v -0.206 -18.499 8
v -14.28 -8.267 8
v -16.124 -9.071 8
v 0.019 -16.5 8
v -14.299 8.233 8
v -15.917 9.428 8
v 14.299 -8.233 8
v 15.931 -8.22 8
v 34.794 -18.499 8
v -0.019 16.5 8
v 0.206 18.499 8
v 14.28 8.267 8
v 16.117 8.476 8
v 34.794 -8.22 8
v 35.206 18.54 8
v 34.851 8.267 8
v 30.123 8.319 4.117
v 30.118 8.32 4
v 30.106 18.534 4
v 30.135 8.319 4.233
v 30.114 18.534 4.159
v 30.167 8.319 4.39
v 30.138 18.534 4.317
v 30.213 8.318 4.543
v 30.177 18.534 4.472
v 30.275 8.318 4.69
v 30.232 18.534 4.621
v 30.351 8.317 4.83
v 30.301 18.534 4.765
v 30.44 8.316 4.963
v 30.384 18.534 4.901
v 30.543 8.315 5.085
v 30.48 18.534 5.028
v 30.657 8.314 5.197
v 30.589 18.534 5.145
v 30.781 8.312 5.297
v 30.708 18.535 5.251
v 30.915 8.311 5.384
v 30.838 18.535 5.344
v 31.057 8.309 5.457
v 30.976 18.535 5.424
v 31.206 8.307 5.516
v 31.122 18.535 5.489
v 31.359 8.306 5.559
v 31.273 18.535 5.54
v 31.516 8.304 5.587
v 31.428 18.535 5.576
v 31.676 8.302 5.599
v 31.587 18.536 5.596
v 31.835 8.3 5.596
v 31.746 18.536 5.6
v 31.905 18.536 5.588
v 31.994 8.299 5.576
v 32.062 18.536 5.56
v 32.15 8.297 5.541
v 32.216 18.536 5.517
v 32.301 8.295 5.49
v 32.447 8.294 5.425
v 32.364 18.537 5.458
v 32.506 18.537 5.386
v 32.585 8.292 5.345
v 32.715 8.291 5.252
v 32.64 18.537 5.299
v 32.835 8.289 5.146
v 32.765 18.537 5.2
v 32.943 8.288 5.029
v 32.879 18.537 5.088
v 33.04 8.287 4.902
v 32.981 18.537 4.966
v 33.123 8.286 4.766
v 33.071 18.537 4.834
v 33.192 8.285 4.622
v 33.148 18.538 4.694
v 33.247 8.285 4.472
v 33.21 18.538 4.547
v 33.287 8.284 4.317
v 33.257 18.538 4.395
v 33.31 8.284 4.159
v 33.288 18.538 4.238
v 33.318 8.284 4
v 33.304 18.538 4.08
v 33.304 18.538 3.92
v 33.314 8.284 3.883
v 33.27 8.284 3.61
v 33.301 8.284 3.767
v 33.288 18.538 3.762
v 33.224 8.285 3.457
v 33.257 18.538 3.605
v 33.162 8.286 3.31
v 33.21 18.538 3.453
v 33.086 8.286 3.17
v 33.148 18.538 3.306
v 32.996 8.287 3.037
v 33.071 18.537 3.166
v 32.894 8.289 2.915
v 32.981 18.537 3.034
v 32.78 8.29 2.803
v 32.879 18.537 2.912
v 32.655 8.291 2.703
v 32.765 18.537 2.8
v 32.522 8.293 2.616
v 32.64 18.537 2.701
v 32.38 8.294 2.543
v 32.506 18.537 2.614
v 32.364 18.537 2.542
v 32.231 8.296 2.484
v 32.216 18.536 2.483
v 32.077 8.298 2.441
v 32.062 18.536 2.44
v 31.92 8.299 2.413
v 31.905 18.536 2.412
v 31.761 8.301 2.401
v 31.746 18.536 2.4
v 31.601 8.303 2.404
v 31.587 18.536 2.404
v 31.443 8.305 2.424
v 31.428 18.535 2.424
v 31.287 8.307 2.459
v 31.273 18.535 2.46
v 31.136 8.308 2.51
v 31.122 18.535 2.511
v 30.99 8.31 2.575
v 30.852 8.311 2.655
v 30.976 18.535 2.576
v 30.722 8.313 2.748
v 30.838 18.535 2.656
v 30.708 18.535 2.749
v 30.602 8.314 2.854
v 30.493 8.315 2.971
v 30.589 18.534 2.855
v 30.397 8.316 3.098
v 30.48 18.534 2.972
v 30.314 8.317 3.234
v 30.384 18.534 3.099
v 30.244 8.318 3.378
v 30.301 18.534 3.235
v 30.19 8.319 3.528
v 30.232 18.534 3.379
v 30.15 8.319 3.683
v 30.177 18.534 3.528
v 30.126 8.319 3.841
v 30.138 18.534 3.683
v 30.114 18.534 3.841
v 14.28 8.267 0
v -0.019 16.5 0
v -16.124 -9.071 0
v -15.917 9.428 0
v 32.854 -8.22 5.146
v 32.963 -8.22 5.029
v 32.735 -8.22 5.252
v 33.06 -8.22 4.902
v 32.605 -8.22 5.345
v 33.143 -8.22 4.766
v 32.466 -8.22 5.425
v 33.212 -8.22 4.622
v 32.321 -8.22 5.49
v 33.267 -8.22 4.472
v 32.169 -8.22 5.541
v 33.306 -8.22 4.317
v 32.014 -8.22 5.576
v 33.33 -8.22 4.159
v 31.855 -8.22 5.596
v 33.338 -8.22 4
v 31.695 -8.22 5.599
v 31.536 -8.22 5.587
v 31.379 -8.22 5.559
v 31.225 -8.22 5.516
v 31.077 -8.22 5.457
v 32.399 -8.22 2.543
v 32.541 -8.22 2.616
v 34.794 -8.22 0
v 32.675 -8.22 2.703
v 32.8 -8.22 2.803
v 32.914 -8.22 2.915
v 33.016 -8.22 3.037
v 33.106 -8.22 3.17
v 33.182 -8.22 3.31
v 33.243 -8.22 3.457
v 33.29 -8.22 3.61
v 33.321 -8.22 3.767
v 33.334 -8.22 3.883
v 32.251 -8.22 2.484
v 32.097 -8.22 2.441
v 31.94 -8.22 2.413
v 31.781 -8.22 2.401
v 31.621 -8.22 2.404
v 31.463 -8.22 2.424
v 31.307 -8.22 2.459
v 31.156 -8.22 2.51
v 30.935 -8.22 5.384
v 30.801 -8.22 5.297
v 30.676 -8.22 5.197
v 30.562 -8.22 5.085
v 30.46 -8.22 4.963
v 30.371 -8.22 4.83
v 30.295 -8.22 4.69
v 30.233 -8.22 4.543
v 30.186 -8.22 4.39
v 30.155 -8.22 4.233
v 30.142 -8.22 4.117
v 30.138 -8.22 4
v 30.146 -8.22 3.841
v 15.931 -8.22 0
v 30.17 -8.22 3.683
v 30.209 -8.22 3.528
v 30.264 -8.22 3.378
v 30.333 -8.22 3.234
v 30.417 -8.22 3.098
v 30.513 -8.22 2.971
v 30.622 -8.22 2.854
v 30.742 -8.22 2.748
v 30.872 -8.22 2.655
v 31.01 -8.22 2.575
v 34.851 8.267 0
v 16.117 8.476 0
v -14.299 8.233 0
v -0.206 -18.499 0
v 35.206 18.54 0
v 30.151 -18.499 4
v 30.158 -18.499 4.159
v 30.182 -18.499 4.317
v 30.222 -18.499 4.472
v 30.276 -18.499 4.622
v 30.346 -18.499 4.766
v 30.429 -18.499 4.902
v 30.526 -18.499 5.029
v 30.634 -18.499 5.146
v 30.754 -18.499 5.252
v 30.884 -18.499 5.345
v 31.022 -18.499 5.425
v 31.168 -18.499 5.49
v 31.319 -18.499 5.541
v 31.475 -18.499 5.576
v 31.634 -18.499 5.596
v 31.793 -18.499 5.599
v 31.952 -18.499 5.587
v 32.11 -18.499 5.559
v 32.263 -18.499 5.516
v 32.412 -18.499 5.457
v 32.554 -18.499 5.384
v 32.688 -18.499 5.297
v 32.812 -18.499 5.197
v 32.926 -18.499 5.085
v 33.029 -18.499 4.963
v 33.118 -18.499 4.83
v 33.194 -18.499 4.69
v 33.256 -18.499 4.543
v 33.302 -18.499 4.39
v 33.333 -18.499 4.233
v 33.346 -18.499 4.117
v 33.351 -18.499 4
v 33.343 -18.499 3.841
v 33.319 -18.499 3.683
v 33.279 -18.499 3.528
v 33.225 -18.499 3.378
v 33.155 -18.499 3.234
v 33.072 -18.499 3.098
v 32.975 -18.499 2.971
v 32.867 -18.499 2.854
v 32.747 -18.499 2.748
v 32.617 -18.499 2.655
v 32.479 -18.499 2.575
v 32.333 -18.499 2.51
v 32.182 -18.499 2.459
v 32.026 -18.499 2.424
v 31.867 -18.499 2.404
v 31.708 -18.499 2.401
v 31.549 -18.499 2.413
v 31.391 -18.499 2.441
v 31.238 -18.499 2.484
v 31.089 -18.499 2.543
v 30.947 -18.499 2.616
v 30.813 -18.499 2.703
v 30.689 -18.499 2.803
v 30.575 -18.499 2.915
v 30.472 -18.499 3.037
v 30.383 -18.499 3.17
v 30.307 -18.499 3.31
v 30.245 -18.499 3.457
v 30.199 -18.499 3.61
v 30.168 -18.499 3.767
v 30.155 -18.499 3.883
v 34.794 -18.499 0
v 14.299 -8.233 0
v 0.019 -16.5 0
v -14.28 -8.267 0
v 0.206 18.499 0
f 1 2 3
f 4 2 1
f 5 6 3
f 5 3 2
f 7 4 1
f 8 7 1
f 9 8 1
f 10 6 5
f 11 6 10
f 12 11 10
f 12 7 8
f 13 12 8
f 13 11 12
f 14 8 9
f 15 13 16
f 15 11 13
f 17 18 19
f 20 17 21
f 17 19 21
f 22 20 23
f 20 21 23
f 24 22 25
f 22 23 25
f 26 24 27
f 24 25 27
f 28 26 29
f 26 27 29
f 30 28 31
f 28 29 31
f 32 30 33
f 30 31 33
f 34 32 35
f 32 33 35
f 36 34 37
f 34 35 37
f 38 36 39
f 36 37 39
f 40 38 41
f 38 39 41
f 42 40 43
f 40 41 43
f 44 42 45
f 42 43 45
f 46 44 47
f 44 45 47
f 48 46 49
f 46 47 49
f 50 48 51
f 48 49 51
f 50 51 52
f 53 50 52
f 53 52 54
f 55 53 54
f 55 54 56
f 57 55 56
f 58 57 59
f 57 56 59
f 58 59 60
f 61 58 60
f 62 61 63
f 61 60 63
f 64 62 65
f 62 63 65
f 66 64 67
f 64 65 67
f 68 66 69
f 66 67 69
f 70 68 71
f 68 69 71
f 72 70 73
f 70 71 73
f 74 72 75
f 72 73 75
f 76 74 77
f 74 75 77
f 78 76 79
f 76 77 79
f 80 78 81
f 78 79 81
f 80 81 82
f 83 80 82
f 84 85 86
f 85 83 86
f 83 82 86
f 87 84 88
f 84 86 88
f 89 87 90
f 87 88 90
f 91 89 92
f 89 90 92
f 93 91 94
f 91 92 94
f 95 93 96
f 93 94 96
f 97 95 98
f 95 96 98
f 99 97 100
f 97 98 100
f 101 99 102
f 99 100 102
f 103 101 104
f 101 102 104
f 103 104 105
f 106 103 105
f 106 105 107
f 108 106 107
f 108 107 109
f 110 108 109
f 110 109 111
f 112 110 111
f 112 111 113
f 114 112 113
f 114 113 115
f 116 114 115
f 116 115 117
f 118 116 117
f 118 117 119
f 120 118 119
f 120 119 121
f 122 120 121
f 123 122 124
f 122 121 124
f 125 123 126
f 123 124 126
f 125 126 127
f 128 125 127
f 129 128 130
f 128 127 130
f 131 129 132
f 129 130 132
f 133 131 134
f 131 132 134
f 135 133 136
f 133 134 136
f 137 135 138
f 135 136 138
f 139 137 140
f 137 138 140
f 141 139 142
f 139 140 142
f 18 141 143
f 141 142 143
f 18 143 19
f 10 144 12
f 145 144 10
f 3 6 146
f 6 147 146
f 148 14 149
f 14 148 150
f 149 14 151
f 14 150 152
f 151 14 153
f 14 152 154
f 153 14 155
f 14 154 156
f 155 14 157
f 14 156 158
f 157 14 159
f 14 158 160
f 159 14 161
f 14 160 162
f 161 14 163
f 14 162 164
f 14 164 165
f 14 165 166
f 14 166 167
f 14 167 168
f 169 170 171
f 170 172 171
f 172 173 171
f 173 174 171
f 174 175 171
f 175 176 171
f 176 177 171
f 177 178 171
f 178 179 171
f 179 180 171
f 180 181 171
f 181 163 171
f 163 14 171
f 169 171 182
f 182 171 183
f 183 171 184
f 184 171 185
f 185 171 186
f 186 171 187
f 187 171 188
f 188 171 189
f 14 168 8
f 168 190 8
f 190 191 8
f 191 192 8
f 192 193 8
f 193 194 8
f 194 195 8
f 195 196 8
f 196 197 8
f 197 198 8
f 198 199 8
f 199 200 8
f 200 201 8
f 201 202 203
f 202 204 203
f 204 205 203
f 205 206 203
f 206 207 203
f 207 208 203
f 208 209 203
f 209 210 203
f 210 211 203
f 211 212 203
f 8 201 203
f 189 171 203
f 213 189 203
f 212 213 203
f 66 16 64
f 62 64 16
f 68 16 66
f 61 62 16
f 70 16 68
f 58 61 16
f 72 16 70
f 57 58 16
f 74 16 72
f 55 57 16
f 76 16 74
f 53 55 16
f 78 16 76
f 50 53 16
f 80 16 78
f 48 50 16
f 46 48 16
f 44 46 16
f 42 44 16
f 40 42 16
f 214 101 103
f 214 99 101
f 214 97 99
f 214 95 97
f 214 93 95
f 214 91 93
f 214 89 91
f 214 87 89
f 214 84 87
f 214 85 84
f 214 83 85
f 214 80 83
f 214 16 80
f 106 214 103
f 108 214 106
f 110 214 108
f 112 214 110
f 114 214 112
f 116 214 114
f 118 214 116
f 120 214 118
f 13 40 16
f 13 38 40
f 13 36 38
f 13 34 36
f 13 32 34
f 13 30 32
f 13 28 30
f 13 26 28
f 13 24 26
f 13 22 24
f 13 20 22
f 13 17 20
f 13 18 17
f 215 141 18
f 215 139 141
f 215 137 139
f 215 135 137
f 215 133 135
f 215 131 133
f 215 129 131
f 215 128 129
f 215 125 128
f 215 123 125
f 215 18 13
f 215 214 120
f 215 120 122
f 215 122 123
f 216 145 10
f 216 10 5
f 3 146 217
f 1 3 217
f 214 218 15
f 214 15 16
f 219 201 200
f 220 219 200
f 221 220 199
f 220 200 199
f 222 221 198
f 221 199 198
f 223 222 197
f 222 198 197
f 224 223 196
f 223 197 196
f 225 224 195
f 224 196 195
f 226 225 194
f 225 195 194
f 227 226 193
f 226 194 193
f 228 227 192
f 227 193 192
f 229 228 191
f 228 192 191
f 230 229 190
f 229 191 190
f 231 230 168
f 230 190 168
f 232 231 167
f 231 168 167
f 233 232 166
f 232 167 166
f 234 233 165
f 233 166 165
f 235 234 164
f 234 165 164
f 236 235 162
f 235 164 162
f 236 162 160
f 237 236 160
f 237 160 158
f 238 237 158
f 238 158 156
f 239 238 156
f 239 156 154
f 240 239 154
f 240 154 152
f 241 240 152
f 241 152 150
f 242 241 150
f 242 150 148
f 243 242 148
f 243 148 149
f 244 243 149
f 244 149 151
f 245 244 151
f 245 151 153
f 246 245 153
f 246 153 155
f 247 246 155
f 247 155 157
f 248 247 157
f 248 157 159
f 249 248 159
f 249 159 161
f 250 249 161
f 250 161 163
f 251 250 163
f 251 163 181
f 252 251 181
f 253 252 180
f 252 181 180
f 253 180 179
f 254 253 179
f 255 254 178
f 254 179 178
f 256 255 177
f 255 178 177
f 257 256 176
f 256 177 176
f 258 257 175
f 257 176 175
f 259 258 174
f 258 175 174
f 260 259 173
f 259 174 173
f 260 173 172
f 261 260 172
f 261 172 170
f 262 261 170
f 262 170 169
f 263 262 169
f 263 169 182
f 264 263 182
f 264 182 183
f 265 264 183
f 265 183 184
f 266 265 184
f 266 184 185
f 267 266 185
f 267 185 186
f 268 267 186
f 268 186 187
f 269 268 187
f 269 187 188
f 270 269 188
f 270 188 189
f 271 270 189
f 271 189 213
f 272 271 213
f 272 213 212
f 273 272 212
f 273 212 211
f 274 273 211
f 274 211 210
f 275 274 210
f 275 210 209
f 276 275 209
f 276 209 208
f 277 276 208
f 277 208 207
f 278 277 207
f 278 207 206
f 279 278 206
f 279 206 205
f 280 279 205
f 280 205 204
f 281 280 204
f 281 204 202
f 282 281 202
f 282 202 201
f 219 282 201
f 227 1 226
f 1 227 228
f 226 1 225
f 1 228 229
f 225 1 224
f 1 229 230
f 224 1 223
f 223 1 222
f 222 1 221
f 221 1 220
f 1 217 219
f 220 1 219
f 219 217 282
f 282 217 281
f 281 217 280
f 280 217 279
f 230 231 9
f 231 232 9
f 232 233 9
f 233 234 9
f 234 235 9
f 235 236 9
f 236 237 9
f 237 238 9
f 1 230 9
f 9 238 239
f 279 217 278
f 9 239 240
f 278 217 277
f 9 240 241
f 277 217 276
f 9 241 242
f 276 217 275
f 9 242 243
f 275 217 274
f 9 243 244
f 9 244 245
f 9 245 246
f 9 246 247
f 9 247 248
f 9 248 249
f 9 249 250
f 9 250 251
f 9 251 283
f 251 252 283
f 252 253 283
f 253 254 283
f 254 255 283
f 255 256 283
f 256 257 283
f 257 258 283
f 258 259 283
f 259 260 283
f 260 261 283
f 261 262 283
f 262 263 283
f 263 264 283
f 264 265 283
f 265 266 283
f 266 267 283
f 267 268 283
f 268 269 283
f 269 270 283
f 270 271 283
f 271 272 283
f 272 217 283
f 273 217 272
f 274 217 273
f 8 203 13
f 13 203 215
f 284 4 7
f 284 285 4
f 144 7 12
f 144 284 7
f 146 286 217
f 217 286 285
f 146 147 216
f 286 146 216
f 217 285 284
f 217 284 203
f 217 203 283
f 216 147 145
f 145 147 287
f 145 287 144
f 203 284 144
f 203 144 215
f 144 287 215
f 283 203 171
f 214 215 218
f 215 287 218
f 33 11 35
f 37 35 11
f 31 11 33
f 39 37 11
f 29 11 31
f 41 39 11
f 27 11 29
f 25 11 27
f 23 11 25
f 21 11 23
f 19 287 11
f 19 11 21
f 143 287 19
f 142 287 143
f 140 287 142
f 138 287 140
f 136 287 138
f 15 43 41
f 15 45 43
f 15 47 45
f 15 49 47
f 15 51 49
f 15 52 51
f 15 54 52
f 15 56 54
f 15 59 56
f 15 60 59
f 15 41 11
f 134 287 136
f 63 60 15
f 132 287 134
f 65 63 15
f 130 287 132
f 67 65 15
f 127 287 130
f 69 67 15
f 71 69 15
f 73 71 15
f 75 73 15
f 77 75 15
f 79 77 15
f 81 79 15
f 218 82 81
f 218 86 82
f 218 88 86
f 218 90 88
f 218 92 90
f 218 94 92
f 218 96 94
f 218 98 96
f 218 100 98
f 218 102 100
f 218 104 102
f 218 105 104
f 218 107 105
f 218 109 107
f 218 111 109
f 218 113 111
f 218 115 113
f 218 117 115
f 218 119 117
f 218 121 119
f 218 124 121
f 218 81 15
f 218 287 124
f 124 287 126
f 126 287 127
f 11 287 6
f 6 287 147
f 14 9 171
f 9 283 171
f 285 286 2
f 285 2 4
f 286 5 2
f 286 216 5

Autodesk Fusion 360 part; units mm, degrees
sketch "Sketch1" plane through (0, 0, 0) normal (0, 0, 1) x (1, 0, 0)
  line L0 (-0.0194, 16.5) -> (-14.2991, 8.2332)
  line L1 (-14.2991, 8.2332) -> (-14.2797, -8.2668)
  line L2 (-14.2797, -8.2668) -> (0.0194, -16.5)
  line L3 (0.0194, -16.5) -> (14.2991, -8.2332)
  line L4 (14.2991, -8.2332) -> (14.2797, 8.2668)
  line L5 (14.2797, 8.2668) -> (-0.0194, 16.5)
  line L6 (0.2061, 18.4989) -> (-15.9174, 9.4279)
  line L7 (-15.9174, 9.4279) -> (-16.1235, -9.0709)
  line L8 (-16.1235, -9.0709) -> (-0.2061, -18.4989)
  line L9 (-0.2061, -18.4989) -> (15.9174, -9.4279)
  line L10 (15.9174, -9.4279) -> (16.1235, 9.0709)
  line L11 (16.1235, 9.0709) -> (0.2061, 18.4989)
  line L12 (0.2061, 18.4989) -> (35.2061, 18.5399)
  line L13 (35.2061, 18.5399) -> (34.8509, 8.2668)
  line L14 (34.8509, 8.2668) -> (16.1169, 8.4755)
  line L15 (0, 0) -> (14.2894, 0.0168)
  line L16 (-0.2061, -18.4989) -> (34.7939, -18.4989)
  line L17 (34.7939, -18.4989) -> (34.7939, -8.2199)
  line L18 (34.7939, -8.2199) -> (15.9309, -8.2199)
  dimension "d3" = 16.5
  dimension "d4" = 18.5
  dimension "d5" = 35
  dimension "d6" = 35
  dimension "d7" = 10.279
extrude "Extrude1" add sketch "Sketch1" along normal blind 8
sketch "Sketch2" plane through (-0.0217, 18.4986, 0) normal (-0.0012, 1, 0) x (-1, -0.0012, 0)
  line L0 (-35.2278, 0) -> (-0.2278, 0)
  line L1 (-0.2278, 0) -> (-0.2278, 8)
  line L2 (-0.2278, 8) -> (-35.2278, 8)
  line L3 (-35.2278, 8) -> (-35.2278, 0)
  line L4 (-35.2278, 4) -> (-31.7278, 4)
  circle A0 centre (-31.7278, 4) radius 1.6
  dimension "d10" = 3.5
  dimension "d11" = 3.2
extrude "Extrude2" cut sketch "Sketch2" against normal blind 120 contours A0
